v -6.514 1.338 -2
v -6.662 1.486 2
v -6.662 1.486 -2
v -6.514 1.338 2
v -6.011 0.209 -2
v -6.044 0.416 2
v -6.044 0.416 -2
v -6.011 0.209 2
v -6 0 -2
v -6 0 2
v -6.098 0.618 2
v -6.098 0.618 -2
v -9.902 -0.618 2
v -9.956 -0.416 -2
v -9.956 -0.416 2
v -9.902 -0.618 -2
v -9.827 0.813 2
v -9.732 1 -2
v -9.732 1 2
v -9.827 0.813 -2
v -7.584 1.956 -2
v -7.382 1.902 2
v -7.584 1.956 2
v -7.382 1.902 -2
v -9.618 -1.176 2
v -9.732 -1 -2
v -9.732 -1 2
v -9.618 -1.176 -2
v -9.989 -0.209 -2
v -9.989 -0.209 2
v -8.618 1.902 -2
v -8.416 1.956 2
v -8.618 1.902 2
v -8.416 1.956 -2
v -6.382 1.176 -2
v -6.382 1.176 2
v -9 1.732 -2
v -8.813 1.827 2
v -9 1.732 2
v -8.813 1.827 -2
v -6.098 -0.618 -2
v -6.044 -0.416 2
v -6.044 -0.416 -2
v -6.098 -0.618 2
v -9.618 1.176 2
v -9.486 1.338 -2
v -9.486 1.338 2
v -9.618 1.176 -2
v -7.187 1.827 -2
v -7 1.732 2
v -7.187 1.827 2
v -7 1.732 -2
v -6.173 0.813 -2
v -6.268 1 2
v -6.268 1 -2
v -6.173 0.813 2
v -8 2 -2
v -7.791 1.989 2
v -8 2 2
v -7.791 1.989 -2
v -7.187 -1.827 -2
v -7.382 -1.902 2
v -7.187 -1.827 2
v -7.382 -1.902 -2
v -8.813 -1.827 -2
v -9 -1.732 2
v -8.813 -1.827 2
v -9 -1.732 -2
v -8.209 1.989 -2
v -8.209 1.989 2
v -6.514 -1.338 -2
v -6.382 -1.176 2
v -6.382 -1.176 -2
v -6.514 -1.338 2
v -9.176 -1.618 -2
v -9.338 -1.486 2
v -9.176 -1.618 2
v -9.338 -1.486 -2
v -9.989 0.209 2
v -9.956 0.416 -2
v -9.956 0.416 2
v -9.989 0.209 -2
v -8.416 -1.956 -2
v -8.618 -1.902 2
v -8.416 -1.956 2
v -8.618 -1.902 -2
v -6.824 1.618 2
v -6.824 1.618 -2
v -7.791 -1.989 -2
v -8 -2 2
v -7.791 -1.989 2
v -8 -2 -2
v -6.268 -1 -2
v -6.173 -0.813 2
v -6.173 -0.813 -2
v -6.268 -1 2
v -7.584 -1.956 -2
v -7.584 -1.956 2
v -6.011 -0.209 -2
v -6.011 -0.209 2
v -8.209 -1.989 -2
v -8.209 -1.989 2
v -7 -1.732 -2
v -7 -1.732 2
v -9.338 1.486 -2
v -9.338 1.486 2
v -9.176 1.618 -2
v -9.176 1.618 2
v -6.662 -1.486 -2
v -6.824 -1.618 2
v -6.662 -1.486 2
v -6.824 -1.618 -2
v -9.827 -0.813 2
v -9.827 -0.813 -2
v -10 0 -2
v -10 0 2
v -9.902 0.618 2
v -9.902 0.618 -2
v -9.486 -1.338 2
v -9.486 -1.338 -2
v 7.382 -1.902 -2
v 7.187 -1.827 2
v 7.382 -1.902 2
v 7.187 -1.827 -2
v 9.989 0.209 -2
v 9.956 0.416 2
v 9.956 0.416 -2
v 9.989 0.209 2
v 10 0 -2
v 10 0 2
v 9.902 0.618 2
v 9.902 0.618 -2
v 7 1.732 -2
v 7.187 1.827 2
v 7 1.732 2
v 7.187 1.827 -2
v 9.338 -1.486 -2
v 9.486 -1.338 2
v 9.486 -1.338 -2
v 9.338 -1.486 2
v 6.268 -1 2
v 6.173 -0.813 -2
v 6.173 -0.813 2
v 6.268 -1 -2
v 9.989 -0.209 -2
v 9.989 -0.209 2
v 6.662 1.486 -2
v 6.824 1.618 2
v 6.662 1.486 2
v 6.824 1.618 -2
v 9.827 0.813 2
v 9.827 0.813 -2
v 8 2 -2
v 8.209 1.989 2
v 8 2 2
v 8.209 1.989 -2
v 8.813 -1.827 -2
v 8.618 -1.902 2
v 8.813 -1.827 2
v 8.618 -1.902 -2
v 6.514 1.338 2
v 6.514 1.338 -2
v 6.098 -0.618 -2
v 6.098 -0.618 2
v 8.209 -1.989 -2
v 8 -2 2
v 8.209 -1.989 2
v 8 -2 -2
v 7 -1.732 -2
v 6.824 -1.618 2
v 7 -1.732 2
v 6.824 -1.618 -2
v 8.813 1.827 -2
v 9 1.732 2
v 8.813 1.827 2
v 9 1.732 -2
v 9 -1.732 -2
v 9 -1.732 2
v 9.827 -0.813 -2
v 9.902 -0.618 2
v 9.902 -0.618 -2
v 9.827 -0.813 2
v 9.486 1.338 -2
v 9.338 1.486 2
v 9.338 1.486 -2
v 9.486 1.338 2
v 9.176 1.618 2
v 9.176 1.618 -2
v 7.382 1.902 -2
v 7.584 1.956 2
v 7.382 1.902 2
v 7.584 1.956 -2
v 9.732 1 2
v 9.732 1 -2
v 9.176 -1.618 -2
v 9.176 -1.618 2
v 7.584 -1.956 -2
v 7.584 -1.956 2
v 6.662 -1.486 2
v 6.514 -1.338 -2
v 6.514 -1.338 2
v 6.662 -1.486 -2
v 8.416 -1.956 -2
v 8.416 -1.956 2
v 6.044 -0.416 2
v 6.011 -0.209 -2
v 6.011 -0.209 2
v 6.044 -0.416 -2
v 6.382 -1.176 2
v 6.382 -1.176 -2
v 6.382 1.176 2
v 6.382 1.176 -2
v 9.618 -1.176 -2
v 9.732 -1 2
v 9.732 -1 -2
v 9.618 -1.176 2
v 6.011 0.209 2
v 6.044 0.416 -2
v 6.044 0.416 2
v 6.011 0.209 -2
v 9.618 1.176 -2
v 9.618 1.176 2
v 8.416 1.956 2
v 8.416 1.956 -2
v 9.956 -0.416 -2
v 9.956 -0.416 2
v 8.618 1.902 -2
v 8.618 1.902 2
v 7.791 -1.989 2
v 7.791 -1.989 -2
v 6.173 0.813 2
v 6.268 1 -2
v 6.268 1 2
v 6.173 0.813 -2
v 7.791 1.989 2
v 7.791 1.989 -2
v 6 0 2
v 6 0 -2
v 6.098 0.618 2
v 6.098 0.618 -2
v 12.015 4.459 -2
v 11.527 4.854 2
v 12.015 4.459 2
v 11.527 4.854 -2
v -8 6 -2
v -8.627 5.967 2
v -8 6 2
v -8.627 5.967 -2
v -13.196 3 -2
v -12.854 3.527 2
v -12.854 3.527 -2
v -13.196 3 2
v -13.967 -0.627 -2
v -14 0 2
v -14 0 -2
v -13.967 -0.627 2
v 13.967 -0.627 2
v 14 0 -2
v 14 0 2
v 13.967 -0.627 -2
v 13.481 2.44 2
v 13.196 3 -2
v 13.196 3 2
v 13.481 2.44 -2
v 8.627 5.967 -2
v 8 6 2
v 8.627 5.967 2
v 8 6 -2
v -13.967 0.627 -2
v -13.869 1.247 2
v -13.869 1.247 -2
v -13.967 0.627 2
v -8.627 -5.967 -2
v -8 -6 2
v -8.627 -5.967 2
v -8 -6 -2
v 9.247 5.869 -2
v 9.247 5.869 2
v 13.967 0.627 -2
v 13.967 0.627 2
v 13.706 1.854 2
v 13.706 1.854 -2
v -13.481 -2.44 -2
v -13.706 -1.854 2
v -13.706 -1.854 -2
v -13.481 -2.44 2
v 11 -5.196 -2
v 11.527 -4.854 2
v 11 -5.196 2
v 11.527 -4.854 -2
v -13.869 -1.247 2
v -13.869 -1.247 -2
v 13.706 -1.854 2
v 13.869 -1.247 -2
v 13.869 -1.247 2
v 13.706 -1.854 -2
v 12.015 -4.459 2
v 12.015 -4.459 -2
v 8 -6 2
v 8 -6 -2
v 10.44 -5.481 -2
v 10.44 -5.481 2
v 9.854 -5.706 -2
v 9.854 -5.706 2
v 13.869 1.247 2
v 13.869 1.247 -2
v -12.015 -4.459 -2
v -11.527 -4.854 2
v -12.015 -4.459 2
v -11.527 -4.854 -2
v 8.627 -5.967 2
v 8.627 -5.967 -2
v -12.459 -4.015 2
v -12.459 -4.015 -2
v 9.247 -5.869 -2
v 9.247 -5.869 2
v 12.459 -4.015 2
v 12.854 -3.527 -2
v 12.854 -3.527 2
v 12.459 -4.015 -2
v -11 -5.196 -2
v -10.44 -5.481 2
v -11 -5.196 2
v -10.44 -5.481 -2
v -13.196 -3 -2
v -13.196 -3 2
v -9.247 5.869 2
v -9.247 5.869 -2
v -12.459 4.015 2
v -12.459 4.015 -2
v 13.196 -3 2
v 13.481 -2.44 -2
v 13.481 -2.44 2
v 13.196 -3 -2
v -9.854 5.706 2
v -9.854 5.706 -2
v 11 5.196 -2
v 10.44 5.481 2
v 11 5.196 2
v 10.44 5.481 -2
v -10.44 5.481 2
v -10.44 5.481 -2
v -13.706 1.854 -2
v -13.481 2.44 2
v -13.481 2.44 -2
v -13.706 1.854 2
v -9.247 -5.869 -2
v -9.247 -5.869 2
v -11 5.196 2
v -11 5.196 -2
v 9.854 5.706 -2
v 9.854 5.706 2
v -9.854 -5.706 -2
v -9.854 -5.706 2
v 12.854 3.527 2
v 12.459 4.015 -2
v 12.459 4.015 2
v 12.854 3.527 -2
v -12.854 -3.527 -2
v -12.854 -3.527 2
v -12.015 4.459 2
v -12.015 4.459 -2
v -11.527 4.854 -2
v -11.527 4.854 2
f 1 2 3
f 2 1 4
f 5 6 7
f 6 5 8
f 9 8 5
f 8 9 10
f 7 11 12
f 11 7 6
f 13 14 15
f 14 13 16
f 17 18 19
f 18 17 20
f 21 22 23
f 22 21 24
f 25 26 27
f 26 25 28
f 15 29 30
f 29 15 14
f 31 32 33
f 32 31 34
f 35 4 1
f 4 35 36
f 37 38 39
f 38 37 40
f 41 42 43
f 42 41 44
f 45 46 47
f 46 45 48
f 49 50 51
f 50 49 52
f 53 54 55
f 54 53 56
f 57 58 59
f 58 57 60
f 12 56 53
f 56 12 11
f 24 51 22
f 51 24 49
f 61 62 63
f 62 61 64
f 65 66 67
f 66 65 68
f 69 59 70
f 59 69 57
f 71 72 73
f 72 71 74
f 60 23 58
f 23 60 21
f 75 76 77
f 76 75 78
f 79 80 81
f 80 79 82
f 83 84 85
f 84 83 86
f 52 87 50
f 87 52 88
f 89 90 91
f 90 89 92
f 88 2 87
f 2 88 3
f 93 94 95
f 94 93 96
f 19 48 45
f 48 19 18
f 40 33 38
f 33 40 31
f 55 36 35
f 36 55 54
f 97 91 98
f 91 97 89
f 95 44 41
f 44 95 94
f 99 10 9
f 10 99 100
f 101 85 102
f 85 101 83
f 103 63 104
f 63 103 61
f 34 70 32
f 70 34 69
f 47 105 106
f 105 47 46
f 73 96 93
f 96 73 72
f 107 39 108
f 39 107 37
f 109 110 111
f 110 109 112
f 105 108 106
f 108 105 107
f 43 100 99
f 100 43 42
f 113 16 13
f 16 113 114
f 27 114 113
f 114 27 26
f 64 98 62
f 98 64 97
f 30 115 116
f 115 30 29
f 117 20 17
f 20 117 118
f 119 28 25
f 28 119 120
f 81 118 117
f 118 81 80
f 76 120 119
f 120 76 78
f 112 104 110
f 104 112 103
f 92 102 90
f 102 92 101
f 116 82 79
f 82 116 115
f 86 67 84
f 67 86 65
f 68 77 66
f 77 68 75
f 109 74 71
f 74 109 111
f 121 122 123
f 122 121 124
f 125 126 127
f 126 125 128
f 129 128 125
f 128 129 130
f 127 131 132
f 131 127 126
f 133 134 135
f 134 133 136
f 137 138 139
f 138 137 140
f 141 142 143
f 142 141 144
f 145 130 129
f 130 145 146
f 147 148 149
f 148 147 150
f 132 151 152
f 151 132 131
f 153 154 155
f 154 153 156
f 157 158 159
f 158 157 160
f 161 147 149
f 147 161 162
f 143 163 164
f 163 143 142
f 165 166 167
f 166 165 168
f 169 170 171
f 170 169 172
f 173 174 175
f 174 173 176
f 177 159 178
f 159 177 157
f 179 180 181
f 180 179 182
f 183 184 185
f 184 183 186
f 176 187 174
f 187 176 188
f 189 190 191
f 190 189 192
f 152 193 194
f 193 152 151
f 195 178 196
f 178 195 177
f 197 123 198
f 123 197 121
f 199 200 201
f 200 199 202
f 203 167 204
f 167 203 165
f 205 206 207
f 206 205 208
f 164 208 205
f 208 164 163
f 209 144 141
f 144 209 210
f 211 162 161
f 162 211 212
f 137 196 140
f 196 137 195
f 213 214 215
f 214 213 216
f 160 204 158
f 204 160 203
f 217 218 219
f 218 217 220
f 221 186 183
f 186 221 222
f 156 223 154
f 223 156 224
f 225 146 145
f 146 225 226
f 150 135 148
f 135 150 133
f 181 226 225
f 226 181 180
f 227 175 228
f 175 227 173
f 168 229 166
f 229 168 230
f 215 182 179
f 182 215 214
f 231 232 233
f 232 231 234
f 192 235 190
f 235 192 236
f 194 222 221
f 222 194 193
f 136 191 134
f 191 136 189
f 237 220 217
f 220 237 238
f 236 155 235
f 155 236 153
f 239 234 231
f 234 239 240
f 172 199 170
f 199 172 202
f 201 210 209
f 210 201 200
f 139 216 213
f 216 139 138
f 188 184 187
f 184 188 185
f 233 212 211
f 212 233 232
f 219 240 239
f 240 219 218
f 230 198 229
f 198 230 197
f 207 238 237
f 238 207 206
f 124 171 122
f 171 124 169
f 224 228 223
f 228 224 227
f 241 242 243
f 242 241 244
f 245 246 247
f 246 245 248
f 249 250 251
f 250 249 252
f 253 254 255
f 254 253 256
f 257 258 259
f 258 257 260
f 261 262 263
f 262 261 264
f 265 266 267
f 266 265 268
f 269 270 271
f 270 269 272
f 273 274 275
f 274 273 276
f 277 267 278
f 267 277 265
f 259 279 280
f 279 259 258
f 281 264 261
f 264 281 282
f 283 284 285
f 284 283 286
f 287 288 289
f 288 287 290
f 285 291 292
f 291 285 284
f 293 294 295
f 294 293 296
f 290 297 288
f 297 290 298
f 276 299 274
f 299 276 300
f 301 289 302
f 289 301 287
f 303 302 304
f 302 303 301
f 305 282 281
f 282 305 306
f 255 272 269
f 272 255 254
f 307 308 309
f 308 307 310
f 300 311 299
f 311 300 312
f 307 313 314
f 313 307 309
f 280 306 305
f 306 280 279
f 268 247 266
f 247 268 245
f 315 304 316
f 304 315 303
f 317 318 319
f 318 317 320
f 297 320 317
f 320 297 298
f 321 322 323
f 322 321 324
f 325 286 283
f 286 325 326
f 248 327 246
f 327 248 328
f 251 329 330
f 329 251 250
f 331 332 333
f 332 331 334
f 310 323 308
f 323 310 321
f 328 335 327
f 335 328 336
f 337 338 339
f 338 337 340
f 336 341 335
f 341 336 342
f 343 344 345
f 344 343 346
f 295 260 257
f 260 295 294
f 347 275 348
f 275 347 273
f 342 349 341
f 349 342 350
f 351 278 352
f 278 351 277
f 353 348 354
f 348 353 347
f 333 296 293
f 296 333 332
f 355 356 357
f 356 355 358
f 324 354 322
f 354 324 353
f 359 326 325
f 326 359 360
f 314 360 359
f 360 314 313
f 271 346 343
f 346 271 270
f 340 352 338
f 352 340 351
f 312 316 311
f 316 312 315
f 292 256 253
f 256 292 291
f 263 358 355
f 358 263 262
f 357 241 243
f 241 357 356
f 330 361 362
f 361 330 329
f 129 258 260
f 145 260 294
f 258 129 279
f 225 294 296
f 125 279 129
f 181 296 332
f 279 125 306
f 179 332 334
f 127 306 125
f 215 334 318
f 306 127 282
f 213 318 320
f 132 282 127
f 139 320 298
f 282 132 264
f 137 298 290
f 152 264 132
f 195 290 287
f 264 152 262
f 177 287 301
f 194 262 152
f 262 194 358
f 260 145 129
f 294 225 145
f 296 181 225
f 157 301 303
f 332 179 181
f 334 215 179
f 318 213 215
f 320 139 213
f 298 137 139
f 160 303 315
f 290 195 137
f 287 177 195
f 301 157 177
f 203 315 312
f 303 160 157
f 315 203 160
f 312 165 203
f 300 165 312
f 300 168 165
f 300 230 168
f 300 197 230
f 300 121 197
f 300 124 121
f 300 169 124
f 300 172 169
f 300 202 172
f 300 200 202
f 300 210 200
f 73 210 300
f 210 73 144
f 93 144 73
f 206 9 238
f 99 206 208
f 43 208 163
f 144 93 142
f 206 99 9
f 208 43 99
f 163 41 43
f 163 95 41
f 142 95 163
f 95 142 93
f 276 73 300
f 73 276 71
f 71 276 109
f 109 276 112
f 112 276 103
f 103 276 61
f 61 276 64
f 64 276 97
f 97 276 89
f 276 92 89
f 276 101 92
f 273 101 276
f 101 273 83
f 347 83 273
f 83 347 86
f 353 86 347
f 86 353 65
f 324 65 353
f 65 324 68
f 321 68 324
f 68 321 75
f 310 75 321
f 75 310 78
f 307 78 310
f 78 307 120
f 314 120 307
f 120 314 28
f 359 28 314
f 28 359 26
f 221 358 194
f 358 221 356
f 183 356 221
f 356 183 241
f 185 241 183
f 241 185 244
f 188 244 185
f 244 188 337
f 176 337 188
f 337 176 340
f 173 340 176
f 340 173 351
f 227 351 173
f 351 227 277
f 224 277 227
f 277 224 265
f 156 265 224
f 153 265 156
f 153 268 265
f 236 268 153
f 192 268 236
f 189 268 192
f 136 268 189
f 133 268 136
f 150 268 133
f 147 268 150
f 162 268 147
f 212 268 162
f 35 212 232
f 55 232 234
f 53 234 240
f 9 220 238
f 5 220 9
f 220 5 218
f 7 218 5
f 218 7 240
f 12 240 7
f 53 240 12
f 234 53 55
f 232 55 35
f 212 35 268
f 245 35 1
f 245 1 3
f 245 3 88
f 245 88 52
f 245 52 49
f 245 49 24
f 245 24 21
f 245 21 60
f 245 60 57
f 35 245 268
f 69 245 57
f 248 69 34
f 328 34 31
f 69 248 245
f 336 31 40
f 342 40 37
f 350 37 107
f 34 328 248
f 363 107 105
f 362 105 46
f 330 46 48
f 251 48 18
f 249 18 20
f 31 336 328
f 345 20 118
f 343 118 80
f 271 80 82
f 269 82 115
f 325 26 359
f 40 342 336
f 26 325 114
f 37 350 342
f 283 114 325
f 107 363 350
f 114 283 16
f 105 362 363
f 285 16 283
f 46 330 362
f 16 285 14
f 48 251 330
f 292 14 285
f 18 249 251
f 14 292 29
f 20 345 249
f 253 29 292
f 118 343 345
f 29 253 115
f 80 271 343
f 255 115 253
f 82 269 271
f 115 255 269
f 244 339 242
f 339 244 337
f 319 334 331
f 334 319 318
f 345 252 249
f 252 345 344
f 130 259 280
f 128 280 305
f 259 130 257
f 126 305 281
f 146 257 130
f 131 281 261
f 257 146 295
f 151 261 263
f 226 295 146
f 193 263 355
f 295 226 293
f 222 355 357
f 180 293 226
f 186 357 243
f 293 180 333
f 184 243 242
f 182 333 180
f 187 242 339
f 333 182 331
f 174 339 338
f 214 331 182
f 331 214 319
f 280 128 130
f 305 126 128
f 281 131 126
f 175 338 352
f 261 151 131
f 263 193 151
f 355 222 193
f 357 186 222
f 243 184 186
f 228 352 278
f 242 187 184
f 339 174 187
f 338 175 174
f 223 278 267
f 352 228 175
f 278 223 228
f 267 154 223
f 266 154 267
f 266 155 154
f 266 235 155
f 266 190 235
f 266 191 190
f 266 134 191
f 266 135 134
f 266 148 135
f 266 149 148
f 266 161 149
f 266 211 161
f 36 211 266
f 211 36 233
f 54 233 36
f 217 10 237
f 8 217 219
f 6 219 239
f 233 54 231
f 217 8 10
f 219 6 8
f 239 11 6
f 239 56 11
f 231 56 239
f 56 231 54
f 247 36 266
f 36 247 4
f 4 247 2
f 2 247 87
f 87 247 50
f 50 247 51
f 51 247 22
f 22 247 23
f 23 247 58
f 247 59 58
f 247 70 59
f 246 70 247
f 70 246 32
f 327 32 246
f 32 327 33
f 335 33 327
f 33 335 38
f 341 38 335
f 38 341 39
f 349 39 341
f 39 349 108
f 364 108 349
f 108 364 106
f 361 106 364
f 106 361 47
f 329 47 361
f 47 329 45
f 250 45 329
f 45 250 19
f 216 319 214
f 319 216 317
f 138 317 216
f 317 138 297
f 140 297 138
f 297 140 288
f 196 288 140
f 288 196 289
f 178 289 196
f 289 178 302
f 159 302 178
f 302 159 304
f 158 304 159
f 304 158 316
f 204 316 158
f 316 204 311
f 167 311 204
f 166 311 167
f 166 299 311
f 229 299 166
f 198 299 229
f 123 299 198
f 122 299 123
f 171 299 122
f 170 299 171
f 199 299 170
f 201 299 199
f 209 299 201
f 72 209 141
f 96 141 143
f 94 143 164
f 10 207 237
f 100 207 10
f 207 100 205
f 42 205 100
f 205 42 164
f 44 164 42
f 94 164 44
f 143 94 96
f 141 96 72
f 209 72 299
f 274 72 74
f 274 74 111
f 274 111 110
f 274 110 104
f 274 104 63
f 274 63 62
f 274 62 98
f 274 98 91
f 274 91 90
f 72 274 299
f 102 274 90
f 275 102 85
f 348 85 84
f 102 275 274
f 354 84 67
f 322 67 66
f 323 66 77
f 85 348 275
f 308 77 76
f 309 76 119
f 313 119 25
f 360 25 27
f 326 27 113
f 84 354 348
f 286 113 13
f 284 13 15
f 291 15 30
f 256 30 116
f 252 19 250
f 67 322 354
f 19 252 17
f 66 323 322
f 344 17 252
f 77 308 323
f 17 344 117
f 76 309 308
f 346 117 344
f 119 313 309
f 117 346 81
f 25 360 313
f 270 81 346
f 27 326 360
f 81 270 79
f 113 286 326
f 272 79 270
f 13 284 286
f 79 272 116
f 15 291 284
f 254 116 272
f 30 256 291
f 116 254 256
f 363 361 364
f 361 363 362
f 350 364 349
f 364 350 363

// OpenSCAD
// Two-hole link plate.
$fn = 60;
eps = 0.02;
hole_d = 4;
length = 28;
width = 12;
thickness = 4;
difference() { hull() { translate([-length/2+width/2,0,0]) cylinder(d=width,h=thickness,center=true); translate([length/2-width/2,0,0]) cylinder(d=width,h=thickness,center=true); } for(x=[-length/2+width/2,length/2-width/2]) translate([x,0,-thickness/2-eps]) cylinder(d=hole_d,h=thickness+2*eps); }
